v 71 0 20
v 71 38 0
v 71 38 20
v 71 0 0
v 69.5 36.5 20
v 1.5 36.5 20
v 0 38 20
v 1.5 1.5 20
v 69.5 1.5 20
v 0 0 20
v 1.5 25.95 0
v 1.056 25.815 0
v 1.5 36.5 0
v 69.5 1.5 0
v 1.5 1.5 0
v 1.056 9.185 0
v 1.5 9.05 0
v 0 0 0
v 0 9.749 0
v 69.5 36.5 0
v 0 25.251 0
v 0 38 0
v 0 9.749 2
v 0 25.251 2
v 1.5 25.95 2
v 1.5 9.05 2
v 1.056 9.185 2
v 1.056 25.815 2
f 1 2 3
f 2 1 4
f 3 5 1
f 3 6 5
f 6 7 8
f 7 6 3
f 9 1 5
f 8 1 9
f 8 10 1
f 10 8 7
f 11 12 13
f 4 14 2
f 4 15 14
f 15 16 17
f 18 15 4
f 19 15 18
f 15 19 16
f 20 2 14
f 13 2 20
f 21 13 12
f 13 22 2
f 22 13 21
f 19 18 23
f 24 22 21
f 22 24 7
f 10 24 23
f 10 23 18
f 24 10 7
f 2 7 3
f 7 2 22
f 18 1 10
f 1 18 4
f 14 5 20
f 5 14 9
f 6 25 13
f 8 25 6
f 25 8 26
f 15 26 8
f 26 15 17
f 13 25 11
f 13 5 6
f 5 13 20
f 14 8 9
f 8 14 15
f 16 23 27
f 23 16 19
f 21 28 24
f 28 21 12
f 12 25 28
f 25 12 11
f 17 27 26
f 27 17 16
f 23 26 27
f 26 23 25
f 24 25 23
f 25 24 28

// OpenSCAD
// E-Ink Voice Agent Case Design
// Based on Waveshare ESP32-C6-ePaper-1.54 (200x200 display)
// Parametric design - adjust dimensions as needed

// == Board Dimensions (mm) ==
// ESP32-C6-ePaper-1.54: 68mm x 35mm x 1.6mm (L x W x H)
// Display: 24mm x 24mm visible area (200x200 pixels)
// USB-C on left edge, buttons on right edge below display

board_length = 68;
board_width = 35;
board_thickness = 1.6;

// == Display Window ==
// Display sits on right side, rotated portrait
display_size = [24, 24];
display_x_offset = 35;  // From left edge
display_y_offset = 5;   // From top edge
display_bezel = 1.5;

// == Button Cutouts ==
// 4 tactile buttons below display
button_diameter = 6;
button_rows = 2;
button_cols = 2;
button_spacing_x = 14;
button_spacing_y = 10;
button_start_x = 42;
button_start_y = 12;

// == Audio Components ==
// Speaker: MAX98357A + 18mm speaker on left side
speaker_diameter = 18;
speaker_offset_x = 12;
speaker_offset_y = 25;

// Microphone: INMP441 on front, top-left near USB-C
mic_grille_diameter = 8;
mic_offset_x = 8;
mic_offset_y = 12;

// == Wall Thickness ==
wall = 1.5;
lip = 1;

// == Parts ==

// Main case body
module case_body() {
    difference() {
        // Outer shell
        cube([board_length + 2*wall, board_width + 2*wall, 20]);
        
        // Inner cavity
        translate([wall, wall, 0])
            cube([board_length, board_width, 22]);
        
        // Display window (portrait orientation)
        translate([display_x_offset + wall - display_bezel,
                  display_y_offset + wall - display_bezel,
                  -1])
            cube([display_size[0] + 2*display_bezel, display_size[1] + 2*display_bezel, 3]);
        
        // Button cutouts (2x2 grid)
        for(row = [0 : button_rows - 1]) {
            for(col = [0 : button_cols - 1]) {
                translate([button_start_x + wall + col * button_spacing_x - button_diameter/2,
                          button_start_y + wall + row * button_spacing_y - button_diameter/2,
                          -1])
                    cylinder(d=button_diameter, h=3, $fn=16);
            }
        }
        
        // Speaker cutout
        translate([speaker_offset_x + wall - speaker_diameter/2,
                  speaker_offset_y + wall - speaker_diameter/2, -1])
            cylinder(d=speaker_diameter, h=3, $fn=32);
        
        // Microphone grille
        translate([mic_offset_x + wall - mic_grille_diameter/2,
                  mic_offset_y + wall - mic_grille_diameter/2, -1])
            cylinder(d=mic_grille_diameter, h=3, $fn=32);
    }
}

// Case lid
module case_lid() {
    difference() {
        // Outer shell
        cube([board_length + 2*wall - 2*lip, board_width + 2*wall - 2*lip, 15]);
        
        // Inner cavity
        translate([lip, lip, 0])
            cube([board_length + 2*wall - 2*lip, board_width + 2*wall - 2*lip, 16]);
    }
}

// Battery compartment (optional, for 1000mAh LiPo)
module battery_compartment() {
    translate([board_length/2, -wall - 10, 0])
        difference() {
            cube([30, 12, 8]);
            translate([5, 4, -1]) cylinder(d=4, h=10, $fn=16); // Wire hole
        }
}

// USB-C cutout
module usb_cutout() {
    translate([board_length - 2, board_width/2, -1])
        cube([4, 12, 3]);
}

// == Render ==
case_body();
